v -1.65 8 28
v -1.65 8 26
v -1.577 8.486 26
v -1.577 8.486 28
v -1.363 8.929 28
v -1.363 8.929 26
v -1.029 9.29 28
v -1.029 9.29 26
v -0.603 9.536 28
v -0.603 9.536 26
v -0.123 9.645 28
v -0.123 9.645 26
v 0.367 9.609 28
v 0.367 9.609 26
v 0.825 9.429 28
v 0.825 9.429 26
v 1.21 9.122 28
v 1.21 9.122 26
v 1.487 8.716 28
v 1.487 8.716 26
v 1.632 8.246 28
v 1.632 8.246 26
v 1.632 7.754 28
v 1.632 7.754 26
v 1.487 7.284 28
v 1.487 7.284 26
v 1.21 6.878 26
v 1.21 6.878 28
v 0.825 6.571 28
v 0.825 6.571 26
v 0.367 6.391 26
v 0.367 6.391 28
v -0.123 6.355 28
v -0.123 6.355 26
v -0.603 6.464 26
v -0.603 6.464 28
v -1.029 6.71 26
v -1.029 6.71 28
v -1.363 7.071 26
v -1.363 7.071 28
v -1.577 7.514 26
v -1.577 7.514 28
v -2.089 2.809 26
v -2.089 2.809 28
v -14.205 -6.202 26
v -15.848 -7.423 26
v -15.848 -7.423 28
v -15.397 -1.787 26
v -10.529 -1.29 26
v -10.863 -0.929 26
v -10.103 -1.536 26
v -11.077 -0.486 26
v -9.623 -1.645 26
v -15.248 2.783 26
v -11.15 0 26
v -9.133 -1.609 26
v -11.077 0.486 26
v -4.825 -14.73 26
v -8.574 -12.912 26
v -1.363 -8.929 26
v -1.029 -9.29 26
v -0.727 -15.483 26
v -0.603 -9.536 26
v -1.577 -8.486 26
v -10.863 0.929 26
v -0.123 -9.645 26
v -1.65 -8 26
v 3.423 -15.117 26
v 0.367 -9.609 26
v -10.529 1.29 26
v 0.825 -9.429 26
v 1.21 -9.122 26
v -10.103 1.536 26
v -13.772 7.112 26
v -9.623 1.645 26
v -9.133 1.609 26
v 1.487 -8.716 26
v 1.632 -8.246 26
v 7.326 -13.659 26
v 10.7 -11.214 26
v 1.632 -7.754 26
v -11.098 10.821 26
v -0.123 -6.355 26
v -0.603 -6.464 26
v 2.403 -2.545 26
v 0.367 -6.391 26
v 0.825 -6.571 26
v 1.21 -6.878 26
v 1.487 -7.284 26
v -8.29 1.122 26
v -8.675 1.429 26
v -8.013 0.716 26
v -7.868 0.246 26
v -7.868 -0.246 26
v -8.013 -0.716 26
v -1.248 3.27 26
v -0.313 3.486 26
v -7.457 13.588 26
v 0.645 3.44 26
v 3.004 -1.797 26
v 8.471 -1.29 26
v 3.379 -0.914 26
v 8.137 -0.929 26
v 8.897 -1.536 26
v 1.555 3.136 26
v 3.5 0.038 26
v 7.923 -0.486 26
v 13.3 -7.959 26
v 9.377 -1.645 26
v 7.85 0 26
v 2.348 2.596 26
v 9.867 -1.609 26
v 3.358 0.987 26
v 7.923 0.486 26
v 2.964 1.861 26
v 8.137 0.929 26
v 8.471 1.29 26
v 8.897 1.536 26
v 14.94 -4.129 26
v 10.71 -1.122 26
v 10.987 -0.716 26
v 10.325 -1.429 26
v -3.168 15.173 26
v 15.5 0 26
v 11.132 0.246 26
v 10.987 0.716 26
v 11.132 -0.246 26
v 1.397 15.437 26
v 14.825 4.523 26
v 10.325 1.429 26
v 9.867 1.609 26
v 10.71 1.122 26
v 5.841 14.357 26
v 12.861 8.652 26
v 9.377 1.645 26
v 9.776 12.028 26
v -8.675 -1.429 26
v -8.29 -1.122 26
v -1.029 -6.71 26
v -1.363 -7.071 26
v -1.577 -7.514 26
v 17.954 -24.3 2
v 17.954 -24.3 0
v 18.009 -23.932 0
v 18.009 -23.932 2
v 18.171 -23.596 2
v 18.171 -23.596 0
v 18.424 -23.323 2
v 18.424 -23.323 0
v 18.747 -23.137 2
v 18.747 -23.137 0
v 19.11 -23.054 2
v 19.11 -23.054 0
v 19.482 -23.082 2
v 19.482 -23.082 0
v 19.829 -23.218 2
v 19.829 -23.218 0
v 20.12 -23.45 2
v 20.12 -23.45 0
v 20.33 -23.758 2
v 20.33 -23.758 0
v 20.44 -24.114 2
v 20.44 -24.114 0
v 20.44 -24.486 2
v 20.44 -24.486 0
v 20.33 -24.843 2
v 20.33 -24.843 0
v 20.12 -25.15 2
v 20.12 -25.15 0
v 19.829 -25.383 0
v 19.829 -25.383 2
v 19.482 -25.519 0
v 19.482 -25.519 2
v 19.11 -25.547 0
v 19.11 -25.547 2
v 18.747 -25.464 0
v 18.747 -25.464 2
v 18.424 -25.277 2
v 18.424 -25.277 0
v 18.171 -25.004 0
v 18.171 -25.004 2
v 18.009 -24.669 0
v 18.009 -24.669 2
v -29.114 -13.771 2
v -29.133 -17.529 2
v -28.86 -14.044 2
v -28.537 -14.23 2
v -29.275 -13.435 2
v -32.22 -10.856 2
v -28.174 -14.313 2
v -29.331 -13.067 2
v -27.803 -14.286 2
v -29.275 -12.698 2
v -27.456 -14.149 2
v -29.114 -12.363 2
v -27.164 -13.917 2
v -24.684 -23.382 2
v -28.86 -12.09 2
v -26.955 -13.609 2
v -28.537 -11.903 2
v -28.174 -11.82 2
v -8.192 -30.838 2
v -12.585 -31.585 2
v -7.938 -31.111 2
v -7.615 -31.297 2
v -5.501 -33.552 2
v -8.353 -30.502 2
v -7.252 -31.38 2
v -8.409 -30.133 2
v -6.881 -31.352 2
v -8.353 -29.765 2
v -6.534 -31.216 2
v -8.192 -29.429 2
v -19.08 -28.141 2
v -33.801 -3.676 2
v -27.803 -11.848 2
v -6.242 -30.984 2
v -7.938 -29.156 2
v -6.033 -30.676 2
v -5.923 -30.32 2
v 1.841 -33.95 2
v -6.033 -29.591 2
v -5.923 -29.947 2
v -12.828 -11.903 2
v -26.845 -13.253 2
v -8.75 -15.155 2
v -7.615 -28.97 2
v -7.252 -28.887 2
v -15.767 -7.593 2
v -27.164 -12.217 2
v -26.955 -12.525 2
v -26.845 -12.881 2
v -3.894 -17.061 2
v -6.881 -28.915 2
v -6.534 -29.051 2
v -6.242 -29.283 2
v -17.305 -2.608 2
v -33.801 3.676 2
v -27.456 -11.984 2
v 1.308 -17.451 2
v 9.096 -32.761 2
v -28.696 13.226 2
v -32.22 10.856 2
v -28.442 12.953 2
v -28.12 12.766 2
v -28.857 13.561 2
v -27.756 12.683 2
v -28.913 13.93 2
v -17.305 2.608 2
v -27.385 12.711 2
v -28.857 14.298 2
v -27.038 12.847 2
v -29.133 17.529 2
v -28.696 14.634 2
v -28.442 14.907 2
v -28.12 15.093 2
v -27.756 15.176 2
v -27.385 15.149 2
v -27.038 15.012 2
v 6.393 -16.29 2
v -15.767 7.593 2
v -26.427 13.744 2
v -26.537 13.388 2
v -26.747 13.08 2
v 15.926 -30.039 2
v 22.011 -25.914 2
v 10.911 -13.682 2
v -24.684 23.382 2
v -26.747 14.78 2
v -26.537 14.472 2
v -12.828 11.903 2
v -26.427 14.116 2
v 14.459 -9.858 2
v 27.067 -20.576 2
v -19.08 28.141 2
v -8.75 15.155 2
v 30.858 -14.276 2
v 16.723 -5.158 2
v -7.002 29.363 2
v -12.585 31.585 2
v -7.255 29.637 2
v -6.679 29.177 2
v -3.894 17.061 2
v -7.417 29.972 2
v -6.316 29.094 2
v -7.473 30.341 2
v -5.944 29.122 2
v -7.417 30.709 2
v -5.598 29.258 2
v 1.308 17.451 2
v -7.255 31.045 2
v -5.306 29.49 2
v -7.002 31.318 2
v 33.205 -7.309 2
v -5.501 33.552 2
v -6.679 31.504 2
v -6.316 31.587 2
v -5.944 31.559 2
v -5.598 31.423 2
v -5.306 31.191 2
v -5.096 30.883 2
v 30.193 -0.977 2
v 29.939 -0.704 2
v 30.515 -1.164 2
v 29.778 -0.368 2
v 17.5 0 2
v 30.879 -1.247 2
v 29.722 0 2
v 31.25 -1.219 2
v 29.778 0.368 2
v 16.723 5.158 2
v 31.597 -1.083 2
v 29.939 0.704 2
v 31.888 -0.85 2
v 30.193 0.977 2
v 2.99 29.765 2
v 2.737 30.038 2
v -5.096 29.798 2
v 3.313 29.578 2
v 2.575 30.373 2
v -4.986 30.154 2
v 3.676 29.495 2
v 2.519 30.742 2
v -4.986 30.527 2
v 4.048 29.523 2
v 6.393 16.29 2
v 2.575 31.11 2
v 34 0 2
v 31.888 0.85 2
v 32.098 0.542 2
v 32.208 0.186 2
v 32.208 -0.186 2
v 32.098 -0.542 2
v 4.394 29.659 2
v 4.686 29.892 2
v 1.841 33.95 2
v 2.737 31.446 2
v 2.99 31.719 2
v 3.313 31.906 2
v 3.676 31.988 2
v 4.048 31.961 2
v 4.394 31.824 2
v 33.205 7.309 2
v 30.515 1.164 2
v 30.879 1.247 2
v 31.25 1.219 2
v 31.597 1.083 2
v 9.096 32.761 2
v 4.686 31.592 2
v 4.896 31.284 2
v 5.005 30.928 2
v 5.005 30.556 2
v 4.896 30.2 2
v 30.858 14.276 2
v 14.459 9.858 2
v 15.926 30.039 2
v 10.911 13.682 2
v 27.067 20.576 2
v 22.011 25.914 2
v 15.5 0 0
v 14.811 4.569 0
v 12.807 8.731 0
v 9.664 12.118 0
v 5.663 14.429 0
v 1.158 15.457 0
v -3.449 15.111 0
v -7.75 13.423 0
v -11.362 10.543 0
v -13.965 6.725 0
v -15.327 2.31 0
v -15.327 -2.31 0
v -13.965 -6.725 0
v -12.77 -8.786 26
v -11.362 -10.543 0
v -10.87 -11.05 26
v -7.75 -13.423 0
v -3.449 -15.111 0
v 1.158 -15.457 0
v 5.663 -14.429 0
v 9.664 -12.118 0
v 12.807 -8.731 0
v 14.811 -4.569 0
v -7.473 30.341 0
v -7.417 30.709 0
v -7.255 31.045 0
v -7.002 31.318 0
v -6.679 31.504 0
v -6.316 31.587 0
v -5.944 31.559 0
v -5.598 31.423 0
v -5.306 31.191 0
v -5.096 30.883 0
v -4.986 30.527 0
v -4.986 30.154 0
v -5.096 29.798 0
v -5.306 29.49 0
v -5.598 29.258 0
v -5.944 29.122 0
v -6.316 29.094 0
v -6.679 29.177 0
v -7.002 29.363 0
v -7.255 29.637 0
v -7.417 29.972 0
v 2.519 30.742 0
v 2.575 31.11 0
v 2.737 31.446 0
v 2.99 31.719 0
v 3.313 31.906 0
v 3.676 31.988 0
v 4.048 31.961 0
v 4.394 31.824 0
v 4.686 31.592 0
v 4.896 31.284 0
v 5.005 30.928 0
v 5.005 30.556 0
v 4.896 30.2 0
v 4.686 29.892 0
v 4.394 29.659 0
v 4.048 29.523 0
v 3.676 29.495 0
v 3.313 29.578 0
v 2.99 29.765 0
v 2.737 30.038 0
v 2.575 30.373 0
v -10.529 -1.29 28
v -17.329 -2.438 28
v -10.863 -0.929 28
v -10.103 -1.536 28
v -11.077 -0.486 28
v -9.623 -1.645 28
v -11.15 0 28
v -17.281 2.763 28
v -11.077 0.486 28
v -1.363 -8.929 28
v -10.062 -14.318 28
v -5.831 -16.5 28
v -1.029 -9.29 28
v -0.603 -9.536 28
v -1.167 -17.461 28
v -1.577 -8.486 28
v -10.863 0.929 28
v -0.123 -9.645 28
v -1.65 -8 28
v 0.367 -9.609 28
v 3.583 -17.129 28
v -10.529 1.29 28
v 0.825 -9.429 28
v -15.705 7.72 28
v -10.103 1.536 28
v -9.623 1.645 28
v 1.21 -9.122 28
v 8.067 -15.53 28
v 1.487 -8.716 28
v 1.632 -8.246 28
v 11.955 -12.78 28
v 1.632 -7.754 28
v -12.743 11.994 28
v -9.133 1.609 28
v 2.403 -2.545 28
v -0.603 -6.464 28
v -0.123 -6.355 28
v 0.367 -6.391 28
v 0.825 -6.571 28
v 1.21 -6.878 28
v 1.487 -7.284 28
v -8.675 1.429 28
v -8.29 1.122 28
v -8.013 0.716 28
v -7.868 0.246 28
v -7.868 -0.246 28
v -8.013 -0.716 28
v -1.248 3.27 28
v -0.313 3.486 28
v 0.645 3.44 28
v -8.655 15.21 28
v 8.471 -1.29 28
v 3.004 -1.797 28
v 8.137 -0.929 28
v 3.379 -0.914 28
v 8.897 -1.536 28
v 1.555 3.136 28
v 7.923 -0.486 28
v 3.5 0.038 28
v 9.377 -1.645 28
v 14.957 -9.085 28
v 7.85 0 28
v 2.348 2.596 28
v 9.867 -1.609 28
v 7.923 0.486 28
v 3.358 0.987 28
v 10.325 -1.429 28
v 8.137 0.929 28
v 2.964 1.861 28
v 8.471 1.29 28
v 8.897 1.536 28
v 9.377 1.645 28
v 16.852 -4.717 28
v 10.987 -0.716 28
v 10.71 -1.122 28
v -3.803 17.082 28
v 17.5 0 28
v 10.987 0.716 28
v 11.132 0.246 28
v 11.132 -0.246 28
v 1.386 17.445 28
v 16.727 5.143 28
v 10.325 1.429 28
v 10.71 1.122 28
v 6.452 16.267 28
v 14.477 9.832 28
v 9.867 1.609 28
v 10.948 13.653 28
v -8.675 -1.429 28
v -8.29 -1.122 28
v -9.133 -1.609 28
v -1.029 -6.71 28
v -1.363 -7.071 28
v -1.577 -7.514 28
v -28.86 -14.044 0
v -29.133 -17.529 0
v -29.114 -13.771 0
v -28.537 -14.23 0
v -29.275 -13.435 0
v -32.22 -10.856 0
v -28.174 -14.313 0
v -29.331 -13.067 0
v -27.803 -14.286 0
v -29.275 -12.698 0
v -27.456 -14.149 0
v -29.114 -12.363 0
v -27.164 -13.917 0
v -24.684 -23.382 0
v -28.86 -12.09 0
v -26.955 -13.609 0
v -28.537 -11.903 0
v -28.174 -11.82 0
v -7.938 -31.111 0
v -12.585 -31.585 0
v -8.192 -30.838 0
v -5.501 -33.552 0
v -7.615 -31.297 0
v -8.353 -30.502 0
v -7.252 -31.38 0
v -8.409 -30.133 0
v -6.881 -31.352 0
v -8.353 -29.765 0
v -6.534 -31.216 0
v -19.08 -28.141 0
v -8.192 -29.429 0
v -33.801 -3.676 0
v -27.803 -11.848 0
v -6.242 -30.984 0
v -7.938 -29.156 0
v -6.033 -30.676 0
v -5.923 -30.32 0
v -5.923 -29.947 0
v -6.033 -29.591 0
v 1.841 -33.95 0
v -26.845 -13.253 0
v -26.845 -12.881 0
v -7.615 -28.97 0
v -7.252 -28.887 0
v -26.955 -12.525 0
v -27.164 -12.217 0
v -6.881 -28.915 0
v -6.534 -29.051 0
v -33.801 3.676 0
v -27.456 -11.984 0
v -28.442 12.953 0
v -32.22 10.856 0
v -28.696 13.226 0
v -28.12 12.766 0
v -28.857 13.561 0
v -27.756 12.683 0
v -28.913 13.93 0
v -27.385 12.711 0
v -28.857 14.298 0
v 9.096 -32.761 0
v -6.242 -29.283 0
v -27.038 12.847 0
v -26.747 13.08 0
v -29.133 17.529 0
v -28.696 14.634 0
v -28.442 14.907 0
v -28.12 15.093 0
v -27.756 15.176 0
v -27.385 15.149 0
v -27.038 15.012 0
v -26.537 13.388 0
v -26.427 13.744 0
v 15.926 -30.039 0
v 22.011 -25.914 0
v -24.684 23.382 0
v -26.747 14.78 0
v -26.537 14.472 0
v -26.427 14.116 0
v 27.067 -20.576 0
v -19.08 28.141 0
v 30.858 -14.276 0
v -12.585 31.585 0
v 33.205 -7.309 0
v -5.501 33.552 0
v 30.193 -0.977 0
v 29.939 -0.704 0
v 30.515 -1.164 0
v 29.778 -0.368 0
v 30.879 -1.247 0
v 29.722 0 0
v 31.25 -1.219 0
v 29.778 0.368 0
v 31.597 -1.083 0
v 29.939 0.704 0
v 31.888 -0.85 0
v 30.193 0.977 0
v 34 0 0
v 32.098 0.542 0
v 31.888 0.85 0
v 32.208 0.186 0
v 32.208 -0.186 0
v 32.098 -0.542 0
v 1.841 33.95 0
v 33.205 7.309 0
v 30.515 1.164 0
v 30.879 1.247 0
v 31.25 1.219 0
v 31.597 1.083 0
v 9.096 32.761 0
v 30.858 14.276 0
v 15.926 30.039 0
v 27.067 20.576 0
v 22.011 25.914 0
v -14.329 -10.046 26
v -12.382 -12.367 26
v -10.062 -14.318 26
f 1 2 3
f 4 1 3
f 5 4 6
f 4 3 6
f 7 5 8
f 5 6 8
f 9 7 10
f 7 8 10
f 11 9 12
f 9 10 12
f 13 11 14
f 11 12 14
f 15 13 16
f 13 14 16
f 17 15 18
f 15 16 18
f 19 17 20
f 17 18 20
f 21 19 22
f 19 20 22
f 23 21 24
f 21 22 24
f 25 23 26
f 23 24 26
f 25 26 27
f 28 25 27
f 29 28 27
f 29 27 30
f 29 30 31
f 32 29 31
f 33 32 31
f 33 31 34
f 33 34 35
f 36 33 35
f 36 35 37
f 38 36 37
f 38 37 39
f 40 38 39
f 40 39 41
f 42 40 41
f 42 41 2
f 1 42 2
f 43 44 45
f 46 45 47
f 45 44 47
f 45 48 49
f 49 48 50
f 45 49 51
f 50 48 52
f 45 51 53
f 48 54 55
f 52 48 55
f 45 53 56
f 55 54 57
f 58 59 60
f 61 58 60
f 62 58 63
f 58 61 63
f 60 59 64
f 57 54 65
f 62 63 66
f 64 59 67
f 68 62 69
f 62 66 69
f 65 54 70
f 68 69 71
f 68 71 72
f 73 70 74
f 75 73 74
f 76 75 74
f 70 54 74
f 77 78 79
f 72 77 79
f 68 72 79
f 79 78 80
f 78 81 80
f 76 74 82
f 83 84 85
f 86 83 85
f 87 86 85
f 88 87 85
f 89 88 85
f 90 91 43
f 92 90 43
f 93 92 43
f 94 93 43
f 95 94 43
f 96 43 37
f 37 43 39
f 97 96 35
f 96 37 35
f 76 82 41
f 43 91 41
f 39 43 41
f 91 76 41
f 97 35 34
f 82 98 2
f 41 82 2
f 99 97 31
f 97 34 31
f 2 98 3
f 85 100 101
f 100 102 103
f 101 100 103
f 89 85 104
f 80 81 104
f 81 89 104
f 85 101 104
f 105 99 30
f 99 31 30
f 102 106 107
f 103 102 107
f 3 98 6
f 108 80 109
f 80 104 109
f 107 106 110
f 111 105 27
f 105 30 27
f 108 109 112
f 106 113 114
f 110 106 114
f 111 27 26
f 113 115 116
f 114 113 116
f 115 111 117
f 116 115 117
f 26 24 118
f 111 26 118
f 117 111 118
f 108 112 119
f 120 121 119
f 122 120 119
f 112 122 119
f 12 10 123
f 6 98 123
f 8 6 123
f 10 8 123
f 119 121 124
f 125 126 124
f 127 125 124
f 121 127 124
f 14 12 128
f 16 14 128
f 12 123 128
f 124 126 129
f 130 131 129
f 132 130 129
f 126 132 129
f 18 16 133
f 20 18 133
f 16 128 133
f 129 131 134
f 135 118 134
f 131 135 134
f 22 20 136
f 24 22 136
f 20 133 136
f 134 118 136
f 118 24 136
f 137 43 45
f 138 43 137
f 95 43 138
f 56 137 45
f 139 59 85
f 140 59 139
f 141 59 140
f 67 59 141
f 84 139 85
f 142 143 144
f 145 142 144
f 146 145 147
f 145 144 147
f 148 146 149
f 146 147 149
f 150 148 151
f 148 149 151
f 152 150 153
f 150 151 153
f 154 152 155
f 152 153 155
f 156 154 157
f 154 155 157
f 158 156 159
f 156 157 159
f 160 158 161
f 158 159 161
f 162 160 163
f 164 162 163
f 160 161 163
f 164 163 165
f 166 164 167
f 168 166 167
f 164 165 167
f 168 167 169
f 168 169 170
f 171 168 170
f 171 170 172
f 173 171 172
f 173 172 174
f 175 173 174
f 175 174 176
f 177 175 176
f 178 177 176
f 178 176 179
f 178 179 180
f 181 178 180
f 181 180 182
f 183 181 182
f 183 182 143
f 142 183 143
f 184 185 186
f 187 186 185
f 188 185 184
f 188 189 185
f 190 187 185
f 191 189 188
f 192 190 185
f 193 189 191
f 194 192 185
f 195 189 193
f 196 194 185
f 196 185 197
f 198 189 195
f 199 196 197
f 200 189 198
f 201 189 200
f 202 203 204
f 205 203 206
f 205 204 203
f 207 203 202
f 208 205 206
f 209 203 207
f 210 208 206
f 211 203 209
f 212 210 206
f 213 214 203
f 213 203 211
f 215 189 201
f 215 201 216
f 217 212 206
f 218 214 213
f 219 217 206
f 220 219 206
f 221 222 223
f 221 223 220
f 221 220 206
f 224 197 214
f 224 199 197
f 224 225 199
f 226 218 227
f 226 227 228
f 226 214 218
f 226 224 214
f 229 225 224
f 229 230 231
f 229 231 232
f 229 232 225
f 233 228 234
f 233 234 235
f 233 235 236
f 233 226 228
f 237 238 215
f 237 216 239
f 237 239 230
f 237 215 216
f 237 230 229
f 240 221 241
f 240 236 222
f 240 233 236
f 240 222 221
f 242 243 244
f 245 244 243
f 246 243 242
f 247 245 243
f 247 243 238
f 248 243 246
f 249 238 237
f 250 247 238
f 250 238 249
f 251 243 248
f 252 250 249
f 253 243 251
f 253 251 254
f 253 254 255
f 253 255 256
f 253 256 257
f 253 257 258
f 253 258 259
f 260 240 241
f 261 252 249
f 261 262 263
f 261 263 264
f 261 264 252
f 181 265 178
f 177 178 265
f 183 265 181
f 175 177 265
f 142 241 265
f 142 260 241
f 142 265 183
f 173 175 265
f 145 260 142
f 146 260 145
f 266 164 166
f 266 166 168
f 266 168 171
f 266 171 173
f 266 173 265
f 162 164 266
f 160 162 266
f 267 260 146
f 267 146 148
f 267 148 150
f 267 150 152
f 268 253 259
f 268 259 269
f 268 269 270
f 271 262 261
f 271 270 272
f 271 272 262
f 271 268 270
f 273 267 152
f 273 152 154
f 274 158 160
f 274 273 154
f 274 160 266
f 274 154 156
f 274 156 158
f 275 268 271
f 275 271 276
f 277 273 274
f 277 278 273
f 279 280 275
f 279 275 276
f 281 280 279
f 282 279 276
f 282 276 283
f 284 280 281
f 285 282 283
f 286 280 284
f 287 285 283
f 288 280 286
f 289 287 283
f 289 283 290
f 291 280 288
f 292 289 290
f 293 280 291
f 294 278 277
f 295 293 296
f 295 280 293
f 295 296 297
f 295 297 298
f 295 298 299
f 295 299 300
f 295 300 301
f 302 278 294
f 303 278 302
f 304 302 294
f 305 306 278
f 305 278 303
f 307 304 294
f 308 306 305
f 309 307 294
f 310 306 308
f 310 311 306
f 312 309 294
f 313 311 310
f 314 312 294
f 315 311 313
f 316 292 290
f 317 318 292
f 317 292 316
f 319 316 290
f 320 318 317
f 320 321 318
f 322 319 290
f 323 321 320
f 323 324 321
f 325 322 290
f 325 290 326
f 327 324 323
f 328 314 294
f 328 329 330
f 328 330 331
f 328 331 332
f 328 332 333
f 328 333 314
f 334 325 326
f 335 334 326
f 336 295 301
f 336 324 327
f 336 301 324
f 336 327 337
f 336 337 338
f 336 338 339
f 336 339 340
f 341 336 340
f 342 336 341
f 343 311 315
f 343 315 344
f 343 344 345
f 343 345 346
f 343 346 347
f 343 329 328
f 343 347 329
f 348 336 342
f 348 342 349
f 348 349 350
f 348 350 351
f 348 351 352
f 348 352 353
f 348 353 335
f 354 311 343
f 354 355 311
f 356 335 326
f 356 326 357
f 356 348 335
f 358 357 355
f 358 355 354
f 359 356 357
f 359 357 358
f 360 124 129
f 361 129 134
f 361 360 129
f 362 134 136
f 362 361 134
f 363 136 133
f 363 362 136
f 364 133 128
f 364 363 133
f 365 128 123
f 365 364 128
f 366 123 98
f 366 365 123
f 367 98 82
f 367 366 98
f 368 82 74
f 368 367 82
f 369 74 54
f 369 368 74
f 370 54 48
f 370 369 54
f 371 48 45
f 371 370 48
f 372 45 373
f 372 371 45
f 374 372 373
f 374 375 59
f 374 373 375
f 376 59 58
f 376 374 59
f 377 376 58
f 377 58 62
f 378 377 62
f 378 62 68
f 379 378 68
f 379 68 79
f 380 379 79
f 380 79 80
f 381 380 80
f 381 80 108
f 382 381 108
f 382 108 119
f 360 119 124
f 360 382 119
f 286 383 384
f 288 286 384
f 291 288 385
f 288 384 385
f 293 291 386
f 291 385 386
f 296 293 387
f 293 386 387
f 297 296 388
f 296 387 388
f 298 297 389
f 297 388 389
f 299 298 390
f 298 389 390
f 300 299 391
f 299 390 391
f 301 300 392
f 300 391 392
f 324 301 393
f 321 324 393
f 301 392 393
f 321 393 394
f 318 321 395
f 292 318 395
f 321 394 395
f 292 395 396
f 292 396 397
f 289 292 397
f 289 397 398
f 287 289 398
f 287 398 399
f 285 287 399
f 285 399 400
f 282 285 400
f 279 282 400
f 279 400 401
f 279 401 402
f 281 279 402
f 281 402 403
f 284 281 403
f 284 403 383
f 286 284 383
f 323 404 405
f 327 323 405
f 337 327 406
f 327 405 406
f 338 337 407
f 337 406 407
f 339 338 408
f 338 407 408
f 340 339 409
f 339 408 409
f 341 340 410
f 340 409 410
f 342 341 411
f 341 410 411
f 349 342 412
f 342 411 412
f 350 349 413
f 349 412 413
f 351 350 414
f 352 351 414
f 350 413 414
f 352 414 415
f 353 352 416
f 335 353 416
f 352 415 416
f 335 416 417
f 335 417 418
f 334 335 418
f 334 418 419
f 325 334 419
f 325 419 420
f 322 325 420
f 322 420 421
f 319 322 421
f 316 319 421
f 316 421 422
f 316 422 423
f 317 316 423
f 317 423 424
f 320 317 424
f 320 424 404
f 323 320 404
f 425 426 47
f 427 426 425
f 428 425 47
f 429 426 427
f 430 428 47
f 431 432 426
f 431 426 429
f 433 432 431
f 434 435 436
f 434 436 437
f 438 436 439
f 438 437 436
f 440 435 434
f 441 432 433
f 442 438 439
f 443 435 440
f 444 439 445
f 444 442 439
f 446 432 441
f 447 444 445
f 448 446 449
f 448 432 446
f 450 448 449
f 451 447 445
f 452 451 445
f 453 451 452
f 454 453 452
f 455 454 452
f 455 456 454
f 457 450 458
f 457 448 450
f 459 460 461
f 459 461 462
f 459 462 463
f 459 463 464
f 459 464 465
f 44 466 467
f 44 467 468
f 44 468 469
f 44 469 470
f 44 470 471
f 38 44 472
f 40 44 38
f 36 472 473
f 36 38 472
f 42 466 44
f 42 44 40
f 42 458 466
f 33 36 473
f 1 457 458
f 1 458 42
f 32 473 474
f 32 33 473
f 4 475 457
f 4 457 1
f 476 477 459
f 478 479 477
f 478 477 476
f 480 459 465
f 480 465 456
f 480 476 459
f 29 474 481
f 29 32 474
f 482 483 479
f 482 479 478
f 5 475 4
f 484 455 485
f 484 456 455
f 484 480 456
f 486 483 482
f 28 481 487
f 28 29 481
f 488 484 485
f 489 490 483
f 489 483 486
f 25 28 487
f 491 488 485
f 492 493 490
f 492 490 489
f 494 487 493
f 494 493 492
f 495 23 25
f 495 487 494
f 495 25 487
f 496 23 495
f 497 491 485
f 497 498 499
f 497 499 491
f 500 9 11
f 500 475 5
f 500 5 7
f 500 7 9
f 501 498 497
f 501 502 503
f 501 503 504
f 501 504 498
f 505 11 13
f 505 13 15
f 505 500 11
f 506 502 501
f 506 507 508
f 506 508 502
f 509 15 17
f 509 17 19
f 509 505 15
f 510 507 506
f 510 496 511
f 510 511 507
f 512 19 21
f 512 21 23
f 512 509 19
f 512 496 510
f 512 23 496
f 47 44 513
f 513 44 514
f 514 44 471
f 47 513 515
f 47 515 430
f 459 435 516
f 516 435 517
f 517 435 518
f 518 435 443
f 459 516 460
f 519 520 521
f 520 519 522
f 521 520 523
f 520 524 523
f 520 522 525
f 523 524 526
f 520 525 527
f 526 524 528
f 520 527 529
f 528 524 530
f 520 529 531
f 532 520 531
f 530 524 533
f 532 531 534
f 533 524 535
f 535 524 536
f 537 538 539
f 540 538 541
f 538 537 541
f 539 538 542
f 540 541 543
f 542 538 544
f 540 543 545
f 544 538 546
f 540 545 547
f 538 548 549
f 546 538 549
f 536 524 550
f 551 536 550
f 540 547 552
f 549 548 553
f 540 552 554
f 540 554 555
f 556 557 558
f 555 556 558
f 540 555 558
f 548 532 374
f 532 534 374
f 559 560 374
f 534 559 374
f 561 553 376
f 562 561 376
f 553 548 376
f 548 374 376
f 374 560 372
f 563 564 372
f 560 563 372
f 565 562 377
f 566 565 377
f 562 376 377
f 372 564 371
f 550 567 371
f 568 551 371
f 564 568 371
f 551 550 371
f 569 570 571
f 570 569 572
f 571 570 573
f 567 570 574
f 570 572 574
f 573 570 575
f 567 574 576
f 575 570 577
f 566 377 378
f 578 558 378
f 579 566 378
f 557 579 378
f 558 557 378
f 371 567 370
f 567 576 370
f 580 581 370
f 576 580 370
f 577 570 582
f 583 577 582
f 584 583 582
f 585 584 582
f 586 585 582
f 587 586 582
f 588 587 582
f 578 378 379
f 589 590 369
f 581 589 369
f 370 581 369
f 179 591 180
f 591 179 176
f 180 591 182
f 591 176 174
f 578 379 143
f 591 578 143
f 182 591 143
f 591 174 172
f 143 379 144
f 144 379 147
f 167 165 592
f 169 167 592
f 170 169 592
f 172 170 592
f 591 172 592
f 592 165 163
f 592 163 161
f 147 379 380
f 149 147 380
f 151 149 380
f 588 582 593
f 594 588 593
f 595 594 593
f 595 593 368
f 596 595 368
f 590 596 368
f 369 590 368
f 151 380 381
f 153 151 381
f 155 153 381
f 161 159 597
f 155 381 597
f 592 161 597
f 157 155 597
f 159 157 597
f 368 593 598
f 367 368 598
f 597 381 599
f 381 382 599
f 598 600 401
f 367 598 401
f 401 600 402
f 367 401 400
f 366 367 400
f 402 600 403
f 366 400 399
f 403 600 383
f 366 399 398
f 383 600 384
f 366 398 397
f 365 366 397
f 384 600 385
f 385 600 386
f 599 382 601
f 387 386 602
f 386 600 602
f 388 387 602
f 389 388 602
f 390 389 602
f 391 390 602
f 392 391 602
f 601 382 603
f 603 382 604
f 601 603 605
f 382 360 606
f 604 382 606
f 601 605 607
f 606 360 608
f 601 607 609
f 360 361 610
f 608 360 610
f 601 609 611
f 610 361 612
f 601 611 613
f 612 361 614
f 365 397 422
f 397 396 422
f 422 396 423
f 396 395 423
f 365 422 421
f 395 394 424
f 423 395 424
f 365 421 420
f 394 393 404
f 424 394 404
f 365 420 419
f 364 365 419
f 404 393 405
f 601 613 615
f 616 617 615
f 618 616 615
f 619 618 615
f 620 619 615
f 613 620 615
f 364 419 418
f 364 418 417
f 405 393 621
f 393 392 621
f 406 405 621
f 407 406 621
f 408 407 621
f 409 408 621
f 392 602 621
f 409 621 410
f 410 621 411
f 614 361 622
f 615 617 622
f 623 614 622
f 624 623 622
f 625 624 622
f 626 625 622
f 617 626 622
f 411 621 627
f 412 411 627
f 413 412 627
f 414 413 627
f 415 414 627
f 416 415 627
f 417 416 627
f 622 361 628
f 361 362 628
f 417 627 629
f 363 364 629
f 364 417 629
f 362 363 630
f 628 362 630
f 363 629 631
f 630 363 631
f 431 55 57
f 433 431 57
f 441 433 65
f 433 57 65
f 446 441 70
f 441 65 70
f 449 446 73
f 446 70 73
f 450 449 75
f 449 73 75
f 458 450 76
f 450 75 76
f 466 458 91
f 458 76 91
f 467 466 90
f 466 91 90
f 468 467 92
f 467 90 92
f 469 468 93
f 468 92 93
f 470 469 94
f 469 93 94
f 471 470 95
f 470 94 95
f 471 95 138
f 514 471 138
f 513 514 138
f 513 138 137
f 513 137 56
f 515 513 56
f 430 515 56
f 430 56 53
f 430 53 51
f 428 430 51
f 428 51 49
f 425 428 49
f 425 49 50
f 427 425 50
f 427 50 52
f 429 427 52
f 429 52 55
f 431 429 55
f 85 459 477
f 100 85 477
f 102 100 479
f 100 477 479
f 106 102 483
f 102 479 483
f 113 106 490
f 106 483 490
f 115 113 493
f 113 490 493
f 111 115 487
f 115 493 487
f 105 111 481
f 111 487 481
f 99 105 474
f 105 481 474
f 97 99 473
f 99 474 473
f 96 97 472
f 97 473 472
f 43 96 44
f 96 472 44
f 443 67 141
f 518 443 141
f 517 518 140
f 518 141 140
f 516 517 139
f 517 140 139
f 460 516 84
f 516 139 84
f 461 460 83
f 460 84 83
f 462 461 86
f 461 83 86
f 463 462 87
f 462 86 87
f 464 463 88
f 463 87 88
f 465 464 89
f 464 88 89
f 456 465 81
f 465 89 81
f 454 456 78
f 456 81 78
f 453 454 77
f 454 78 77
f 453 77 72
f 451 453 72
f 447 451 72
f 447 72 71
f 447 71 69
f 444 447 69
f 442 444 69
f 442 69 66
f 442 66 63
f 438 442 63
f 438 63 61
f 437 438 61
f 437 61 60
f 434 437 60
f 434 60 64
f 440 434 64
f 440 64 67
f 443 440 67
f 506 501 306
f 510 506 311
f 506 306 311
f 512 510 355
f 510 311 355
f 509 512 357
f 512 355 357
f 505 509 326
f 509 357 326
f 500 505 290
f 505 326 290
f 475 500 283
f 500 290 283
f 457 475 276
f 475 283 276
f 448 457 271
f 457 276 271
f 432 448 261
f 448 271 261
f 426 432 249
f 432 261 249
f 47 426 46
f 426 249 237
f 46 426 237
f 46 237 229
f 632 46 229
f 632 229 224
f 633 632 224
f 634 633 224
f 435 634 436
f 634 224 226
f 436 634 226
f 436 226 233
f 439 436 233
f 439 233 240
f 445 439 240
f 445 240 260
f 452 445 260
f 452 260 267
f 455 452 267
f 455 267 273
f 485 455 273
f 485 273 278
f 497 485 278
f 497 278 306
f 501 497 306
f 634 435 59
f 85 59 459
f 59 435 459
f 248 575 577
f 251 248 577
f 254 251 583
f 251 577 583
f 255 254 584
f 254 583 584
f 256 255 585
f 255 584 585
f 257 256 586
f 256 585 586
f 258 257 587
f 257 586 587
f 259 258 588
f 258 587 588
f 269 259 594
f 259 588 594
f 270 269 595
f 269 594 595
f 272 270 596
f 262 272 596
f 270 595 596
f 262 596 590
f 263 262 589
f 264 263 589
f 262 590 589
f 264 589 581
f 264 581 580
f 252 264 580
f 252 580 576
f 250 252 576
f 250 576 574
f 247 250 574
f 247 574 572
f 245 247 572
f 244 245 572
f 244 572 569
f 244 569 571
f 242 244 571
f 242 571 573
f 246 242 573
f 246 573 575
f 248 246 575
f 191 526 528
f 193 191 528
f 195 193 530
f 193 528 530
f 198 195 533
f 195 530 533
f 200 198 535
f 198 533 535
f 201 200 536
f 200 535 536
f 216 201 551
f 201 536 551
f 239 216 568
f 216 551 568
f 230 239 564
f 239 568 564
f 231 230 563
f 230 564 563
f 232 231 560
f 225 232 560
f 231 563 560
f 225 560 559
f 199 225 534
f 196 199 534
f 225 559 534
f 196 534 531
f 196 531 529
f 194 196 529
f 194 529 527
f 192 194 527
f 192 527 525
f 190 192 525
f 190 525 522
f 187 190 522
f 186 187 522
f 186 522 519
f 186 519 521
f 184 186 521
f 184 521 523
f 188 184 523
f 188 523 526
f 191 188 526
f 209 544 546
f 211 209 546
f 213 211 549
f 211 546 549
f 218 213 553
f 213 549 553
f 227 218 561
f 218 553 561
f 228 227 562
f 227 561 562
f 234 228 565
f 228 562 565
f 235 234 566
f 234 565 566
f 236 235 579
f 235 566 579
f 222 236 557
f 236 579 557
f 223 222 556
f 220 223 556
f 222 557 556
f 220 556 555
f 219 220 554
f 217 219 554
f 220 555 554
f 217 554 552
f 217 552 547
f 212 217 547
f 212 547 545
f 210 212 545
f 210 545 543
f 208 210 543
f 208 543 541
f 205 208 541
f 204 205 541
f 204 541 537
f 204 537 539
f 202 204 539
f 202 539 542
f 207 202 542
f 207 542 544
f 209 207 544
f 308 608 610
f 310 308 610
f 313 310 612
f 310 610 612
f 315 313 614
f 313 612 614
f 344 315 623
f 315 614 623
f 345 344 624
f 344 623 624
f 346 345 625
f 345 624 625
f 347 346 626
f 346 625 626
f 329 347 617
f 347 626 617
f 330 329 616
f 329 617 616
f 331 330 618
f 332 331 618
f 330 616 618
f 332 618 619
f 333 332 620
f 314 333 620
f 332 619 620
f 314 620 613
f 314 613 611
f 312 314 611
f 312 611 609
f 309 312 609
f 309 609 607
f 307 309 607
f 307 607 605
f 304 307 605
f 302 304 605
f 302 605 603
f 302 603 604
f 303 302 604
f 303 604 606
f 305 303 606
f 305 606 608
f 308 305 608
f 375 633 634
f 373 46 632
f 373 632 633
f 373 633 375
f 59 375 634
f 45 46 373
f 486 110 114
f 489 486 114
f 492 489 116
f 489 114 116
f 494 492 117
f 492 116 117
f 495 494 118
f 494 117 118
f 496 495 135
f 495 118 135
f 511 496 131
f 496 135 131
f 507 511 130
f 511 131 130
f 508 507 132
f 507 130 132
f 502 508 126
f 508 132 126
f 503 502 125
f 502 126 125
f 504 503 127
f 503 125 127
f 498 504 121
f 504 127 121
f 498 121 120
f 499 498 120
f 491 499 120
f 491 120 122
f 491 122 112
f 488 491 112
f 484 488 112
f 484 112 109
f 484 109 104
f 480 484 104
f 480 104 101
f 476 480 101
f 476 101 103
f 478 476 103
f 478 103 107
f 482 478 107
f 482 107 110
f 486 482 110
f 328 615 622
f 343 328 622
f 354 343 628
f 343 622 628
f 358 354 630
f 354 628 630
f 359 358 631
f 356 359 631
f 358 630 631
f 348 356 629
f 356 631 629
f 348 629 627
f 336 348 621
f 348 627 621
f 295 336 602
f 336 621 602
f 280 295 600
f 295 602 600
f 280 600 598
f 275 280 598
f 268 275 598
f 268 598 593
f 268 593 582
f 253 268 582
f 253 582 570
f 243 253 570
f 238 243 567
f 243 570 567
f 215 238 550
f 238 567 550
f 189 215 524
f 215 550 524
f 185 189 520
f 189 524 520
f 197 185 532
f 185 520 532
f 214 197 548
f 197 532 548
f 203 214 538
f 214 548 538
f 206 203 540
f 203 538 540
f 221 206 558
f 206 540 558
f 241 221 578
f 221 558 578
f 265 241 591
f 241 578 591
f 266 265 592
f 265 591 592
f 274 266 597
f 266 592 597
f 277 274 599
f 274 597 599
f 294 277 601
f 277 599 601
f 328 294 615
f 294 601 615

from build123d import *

# Parameters (mm, degrees)
F2_R      = 17.5
F3_DEPTH  = 28
F4_T      = -2
F6_D      = 3.3
F2_R_2    = 34
F7_DEPTH  = 2
F9_D      = 2.5
F10_DEPTH = 2


with BuildPart() as f3:
    # F2 (on Top) → F3 (new body)
    with BuildSketch(Plane.XY):
        Circle(F2_R)
    extrude(amount=F3_DEPTH)

    # F4
    f4_openings = [f3.faces().sort_by_distance(p)[0] for p in [
        (0, 0, 0),
    ]]
    offset(amount=F4_T, openings=f4_openings)

    # F6 (through all)
    with Locations(Plane.XY.offset(28)):
        with Locations((0, 8), (-9.5, 0), (0, -8), (9.5, 0)):
            Hole(F6_D / 2)

    # F2 (on Top) → F7 (join)
    with BuildSketch(Plane.XY):
        Circle(F2_R_2)
        Circle(F2_R, mode=Mode.SUBTRACT)
    extrude(amount=F7_DEPTH)

    # F9 (through all)
    with Locations(Plane.XY.offset(2)):
        with Locations((-6.2225225174, 30.3406529148), (-27.6628416756, 13.9299029504), (-28.0808143116, -13.0668616498), (-7.1588025741, -30.1334789143), (19.2035334136, -24.3001915673), (30.972165016, 0), (3.7694229457, 30.7419331928)):
            Hole(F9_D / 2)

    # F5 (on face) → F10 (cut, through all)
    with BuildSketch(Plane.XY.offset(28)):
        with BuildLine():
            ThreePointArc((2.4031919002, -2.5445370288), (2.6811555509, 2.2497566339), (-2.0885698997, 2.8085362333))
            Line((-2.0885698997, 2.8085362333), (-15.8475312913, -7.4233248596))
            ThreePointArc((-15.8475312913, -7.4233248596), (-13.4057777546, -11.2487831695), (-10.0624428041, -14.3177248477))
            Line((-10.0624428041, -14.3177248477), (2.4031919002, -2.5445370288))
        make_face()
    extrude(amount=-F10_DEPTH, mode=Mode.SUBTRACT)


solid = f3.part
